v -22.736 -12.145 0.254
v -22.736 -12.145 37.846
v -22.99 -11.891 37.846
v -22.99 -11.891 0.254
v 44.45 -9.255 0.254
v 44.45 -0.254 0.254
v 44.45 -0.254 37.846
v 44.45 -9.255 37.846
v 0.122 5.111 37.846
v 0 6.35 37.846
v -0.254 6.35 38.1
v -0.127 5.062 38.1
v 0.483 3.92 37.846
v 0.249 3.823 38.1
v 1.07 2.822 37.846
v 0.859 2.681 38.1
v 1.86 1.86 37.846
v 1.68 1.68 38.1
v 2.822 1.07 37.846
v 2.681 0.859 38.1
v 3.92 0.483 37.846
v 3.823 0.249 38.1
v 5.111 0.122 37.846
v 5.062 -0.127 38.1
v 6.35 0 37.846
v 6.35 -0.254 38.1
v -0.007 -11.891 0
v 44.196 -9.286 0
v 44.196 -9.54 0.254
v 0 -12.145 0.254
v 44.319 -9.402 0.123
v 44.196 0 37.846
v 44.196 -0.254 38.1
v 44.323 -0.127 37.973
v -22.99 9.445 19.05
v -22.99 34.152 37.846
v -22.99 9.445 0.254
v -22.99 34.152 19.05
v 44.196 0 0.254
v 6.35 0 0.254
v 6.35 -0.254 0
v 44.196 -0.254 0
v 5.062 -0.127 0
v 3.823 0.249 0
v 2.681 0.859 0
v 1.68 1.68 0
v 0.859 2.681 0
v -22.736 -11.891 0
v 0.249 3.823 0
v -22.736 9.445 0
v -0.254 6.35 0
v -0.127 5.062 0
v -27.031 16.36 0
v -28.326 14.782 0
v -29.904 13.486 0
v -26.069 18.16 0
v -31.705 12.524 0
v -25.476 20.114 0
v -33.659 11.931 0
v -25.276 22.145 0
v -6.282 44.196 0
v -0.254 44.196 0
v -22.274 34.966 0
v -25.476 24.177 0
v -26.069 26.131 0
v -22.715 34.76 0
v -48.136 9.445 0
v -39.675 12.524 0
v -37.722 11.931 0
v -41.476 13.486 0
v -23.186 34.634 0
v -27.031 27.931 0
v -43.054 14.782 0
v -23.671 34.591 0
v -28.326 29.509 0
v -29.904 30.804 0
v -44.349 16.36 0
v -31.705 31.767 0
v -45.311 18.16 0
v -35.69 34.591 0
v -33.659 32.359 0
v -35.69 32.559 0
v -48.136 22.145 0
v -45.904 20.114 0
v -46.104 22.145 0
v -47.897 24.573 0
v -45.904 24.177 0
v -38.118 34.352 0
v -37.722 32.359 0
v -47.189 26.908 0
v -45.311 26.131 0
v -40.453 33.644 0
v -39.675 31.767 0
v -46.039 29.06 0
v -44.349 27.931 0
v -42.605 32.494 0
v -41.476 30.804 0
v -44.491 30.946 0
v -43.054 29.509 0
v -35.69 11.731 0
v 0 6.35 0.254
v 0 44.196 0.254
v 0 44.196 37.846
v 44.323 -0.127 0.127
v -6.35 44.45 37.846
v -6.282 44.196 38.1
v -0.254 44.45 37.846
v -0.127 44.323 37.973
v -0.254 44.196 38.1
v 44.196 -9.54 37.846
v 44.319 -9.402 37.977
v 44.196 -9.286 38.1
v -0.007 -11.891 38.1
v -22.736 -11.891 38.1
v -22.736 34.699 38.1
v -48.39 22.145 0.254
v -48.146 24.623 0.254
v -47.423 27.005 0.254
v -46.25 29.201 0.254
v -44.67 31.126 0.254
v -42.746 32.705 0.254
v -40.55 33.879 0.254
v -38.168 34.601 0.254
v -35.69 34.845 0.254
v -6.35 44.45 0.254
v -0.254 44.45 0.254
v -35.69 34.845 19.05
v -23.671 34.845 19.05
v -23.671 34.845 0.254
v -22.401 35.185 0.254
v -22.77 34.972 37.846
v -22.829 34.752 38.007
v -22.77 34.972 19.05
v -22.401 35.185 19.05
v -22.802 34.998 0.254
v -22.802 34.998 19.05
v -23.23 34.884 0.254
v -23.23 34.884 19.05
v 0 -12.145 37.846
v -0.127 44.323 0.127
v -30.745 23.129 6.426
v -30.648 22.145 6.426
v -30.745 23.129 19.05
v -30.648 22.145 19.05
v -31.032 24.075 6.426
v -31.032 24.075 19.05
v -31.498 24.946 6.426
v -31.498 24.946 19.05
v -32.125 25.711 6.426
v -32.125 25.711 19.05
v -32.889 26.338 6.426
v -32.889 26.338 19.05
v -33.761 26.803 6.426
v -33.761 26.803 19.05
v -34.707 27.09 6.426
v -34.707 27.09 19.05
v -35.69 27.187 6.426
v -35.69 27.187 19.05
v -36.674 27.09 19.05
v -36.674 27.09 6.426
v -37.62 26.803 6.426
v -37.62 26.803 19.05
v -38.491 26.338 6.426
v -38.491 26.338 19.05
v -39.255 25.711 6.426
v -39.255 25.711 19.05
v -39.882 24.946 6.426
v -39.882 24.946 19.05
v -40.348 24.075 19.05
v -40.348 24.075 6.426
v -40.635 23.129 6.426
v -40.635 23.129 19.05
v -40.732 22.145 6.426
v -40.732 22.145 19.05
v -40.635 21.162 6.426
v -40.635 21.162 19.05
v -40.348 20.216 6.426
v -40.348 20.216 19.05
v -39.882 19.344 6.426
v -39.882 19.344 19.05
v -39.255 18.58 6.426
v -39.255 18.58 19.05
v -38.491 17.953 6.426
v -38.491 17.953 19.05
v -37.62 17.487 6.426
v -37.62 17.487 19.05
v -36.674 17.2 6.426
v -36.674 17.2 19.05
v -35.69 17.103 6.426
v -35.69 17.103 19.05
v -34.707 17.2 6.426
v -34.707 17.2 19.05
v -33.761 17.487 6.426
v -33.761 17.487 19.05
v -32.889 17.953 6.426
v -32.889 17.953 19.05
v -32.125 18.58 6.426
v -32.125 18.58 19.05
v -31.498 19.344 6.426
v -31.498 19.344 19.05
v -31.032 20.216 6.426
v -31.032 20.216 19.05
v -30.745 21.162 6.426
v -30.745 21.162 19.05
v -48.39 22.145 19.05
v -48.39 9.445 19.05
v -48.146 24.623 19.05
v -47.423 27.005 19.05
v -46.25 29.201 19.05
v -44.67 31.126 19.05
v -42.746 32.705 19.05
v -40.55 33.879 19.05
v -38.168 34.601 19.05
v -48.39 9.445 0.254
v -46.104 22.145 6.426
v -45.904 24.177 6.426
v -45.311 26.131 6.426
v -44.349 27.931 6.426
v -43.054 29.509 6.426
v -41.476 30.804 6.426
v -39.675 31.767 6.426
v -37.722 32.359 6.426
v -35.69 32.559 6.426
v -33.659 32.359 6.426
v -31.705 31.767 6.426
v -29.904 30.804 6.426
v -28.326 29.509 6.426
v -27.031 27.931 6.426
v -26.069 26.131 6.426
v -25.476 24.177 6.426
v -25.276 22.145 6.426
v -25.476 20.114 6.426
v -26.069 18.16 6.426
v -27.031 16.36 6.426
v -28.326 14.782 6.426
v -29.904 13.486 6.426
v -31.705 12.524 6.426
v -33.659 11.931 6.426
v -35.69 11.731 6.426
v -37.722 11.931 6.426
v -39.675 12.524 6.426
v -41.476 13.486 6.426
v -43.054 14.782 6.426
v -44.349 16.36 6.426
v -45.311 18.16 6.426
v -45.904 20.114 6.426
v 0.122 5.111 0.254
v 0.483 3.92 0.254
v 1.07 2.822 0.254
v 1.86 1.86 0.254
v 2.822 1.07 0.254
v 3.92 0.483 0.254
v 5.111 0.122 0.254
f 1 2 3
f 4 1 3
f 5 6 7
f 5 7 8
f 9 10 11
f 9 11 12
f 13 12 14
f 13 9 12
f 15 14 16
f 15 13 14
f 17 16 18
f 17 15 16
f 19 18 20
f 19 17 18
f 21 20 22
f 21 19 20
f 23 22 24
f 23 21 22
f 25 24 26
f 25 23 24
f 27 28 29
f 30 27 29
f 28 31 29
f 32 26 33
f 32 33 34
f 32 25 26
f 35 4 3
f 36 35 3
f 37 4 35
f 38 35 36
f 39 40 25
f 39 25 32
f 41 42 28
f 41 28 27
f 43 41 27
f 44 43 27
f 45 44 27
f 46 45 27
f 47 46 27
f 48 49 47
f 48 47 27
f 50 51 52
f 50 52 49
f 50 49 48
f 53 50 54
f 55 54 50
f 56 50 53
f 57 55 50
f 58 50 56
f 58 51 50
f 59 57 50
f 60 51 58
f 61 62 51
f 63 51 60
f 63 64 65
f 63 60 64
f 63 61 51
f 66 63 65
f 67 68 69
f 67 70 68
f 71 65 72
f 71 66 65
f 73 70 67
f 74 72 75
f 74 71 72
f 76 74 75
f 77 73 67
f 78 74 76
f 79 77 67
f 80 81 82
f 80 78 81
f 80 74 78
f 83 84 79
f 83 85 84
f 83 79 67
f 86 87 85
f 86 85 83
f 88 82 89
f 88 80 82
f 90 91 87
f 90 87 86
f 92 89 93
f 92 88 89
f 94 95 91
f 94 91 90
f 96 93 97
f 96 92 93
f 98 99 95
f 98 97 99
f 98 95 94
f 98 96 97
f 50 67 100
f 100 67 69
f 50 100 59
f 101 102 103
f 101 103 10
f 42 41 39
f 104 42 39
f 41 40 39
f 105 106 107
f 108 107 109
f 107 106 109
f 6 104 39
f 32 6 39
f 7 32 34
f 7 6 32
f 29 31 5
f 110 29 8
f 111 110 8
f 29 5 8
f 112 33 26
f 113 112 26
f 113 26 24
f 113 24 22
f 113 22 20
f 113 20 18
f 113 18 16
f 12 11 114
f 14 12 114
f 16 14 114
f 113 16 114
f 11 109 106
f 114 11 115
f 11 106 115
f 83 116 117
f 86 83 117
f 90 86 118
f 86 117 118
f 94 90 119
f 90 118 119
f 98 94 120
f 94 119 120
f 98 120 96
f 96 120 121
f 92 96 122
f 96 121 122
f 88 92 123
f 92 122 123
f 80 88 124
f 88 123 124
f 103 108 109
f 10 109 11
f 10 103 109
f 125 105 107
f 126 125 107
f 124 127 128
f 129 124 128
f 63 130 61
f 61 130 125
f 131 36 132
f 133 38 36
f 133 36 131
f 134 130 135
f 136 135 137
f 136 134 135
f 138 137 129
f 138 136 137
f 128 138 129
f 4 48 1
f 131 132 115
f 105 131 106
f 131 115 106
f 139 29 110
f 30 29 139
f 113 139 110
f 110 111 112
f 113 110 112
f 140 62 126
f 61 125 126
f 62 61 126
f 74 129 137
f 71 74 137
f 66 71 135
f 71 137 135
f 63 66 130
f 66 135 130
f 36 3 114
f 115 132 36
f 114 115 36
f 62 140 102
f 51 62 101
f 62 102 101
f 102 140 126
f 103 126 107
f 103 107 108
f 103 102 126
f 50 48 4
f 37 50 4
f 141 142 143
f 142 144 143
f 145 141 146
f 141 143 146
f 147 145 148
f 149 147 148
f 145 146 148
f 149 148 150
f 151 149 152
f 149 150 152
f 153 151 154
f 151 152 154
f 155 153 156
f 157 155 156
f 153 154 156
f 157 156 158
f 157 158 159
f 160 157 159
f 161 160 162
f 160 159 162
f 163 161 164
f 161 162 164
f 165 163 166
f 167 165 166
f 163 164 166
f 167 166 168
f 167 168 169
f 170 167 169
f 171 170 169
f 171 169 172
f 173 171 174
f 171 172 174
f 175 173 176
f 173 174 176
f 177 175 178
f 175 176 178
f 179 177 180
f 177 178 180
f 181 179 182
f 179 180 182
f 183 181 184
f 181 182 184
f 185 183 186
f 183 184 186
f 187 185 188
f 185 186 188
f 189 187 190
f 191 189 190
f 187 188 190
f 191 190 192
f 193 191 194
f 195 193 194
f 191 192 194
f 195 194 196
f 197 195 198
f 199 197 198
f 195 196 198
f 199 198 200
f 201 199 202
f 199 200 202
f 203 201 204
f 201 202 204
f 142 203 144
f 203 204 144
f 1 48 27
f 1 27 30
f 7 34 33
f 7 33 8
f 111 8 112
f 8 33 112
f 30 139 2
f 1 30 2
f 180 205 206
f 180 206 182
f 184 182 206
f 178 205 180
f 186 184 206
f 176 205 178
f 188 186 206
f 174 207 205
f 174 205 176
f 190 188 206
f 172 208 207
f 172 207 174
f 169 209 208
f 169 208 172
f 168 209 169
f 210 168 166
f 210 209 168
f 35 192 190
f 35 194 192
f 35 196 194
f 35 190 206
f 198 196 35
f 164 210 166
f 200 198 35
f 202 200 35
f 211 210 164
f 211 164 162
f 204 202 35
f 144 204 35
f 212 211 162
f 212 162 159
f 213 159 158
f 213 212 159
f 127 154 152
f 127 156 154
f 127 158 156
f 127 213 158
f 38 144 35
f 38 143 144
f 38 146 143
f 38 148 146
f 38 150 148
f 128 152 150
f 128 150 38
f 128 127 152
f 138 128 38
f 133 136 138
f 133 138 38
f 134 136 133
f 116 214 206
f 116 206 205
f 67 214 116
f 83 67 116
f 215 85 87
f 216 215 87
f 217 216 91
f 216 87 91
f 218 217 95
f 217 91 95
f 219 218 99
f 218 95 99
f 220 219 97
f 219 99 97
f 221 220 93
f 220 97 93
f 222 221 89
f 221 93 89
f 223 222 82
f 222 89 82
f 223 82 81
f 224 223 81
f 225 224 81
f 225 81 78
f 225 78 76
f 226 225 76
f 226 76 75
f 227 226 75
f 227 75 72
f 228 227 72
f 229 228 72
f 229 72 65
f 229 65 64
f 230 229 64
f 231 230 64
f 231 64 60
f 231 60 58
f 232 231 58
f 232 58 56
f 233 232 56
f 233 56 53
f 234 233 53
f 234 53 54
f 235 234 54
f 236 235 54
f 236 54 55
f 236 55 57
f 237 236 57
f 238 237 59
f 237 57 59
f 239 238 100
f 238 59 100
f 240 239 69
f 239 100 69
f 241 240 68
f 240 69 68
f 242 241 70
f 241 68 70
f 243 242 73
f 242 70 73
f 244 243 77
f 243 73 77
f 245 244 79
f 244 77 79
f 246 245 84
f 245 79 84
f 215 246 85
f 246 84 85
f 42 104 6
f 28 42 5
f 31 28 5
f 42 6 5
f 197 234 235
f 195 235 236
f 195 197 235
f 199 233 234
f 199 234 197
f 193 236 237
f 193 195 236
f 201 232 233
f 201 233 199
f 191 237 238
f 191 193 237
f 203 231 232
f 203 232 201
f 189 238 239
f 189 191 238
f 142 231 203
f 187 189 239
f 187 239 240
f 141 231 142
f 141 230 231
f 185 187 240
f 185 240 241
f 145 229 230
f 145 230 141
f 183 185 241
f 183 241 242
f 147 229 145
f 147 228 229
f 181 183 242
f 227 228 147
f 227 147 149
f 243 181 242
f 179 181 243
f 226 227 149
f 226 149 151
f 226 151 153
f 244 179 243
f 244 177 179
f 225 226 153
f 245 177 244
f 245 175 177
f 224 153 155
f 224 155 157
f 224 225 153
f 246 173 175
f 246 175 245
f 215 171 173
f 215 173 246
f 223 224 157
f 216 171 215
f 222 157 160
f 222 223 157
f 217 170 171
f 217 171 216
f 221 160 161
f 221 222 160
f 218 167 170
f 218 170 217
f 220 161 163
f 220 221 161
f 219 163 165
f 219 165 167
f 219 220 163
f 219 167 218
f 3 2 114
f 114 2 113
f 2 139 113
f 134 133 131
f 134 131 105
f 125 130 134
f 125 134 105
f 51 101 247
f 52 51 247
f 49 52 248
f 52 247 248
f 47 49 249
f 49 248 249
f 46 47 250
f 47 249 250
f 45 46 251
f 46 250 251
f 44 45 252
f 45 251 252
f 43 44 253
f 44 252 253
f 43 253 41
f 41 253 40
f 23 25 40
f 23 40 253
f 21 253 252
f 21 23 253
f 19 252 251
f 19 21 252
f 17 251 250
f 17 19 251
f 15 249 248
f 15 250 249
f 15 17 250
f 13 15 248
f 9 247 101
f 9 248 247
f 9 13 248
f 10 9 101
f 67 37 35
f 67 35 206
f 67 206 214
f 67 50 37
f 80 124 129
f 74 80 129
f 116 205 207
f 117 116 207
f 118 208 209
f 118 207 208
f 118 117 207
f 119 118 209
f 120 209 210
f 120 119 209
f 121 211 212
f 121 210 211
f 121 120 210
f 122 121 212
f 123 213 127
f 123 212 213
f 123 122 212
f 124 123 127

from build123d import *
from OCP.BRepFilletAPI import BRepFilletAPI_MakeChamfer

# Parameters (mm, degrees)
BOSS_EXTRUDE1_DEPTH                                  = 38.1
FILLET2_R                                            = 6.35
CUT_EXTRUDE1_START                                   = -19.05
CUT_EXTRUDE1_DEPTH                                   = 19.05
FILLET3_R                                            = 2.54
CBORE_FOR_3_8_BINDING_HEAD_MACHINE_SCREW_D           = 10.0838
CBORE_FOR_3_8_BINDING_HEAD_MACHINE_SCREW_CBORE_D     = 20.828
CBORE_FOR_3_8_BINDING_HEAD_MACHINE_SCREW_CBORE_DEPTH = 6.4262
CHAMFER3_SIZE                                        = 0.254
CHAMFER5_SIZE                                        = 0.254
CHAMFER5_SIZE2                                       = 0.270375256


with BuildPart() as part:
    # Sketch1 → Boss-Extrude1 (new body)
    with BuildSketch(Plane.XY):
        with BuildLine():
            Line((0, 0), (44.45, 0))
            Line((44.45, 0), (44.45, -9.525))
            Line((44.45, -9.525), (0, -12.1446544))
            Line((0, -12.1446544), (-22.9902, -12.1446544))
            Line((-22.9902, -12.1446544), (-22.9902, 9.4453456))
            Line((-22.9902, 9.4453456), (-48.3902, 9.4453456))
            Line((-48.3902, 9.4453456), (-48.3902, 22.1453456))
            ThreePointArc((-48.3902, 22.1453456), (-44.670456121, 31.125601721), (-35.6902, 34.8453456))
            Line((-35.6902, 34.8453456), (-22.9902, 34.8453456))
            Line((-22.9902, 34.8453456), (-6.35, 44.45))
            Line((-6.35, 44.45), (0, 44.45))
            Line((0, 44.45), (0, 0))
        make_face()
    extrude(amount=BOSS_EXTRUDE1_DEPTH)

    # Fillet2
    fillet2_edges = [part.edges().sort_by_distance(p)[0] for p in [
        (0, 0, 19.05),
    ]]
    fillet(fillet2_edges, radius=FILLET2_R)

    # Sketch3 → Cut-Extrude1 (cut)
    with BuildSketch(Plane.XY.offset(38.1).offset(CUT_EXTRUDE1_START)):
        with BuildLine():
            Line((-48.3902, 9.4453456), (-22.9902, 9.4453456))
            Line((-22.9902, 9.4453456), (-22.9902, 34.8453456))
            Line((-22.9902, 34.8453456), (-35.6902, 34.8453456))
            ThreePointArc((-35.6902, 34.8453456), (-44.670456121, 31.125601721), (-48.3902, 22.1453456))
            Line((-48.3902, 22.1453456), (-48.3902, 9.4453456))
        make_face()
    extrude(amount=CUT_EXTRUDE1_DEPTH, mode=Mode.SUBTRACT)

    # Fillet3
    fillet3_edges = [part.edges().sort_by_distance(p)[0] for p in [
        (-22.9902, 34.8453456, 9.525),
    ]]
    fillet(fillet3_edges, radius=FILLET3_R)

    # CBORE for 3/8 Binding Head Machine Screw1 (through all)
    with Locations(Plane(origin=(0, 0, 0), x_dir=(-1, 0, 0), z_dir=(0, 0, -1))):
        with Locations((35.6902, 22.1453456)):
            CounterBoreHole(CBORE_FOR_3_8_BINDING_HEAD_MACHINE_SCREW_D / 2, CBORE_FOR_3_8_BINDING_HEAD_MACHINE_SCREW_CBORE_D / 2, CBORE_FOR_3_8_BINDING_HEAD_MACHINE_SCREW_CBORE_DEPTH)

    # Chamfer3
    chamfer3_edges = [part.edges().sort_by_distance(p)[0] for p in [
        (25.4, 0, 0),
        (44.45, 0, 19.05),
        (0, 44.45, 19.05),
        (0, 25.4, 0),
        (0, 25.4, 38.1),
        (1.859871939, 1.859871939, 0),
        (1.859871939, 1.859871939, 38.1),
        (25.4, 0, 38.1),
    ]]
    chamfer(chamfer3_edges, length=CHAMFER3_SIZE)

    # Chamfer5: one chamfer whose edges measure the first distance from different faces: ONE call of the kernel's chamfer builder (chamfer() names one face for all edges)
    chamfer5_edges_1 = [part.edges().sort_by_distance(p)[0] for p in [
        (44.45, -4.8895, 0),
        (-14.6701, 39.6476728, 38.1),
        (-48.3902, 15.7953456, 0),
        (-44.670456121, 31.125601721, 0),
        (-14.375444039, 39.817746998, 0),
        (44.45, -4.8895, 38.1),
        (-29.680416649, 34.8453456, 0),
        (-23.013375005, 34.931855935, 0),
        (-3.302, 44.45, 38.1),
        (-3.302, 44.45, 0),
    ]]
    chamfer5_edges_2 = [part.edges().sort_by_distance(p)[0] for p in [
        (44.45, -9.525, 19.05),
    ]]
    chamfer5_side_2 = [part.faces().sort_by_distance(p)[0] for p in [
        (22.225, -10.8348272, 19.05),
    ]]
    chamfer5 = BRepFilletAPI_MakeChamfer(part.part.solid().wrapped)
    for e in chamfer5_edges_1:
        chamfer5.Add(CHAMFER5_SIZE, e.wrapped)
    for e in chamfer5_edges_2:
        chamfer5.Add(CHAMFER5_SIZE, CHAMFER5_SIZE2, e.wrapped, chamfer5_side_2[0].wrapped)  # the first distance lies on this face
    add(Compound.cast(chamfer5.Shape()), mode=Mode.REPLACE)

    # Chamfer6
    # the kernel refuses this chamfer: 0.693641083, 0.254 mm, written as the material it takes off along each edge
    with BuildSketch(Plane(origin=(-22.820866667, -11.975321067, 0.169333333), x_dir=(0, -0.7071067811865468, 0.7071067811865481), z_dir=(-0.5773502691896234, -0.5773502691896274, -0.5773502691896264))) as chamfer6_piece_1:
        Polygon((-0.179605122, -0.103695066), (0.179605122, -0.103695066), (0, 0.207390132), align=None)
    extrude(amount=0.32262333, mode=Mode.SUBTRACT)
    with BuildSketch(Plane(origin=(-22.820866667, -11.975321067, 37.930666667), x_dir=(0, -0.70710678118655, -0.707106781186545), z_dir=(-0.5773502691896217, -0.5773502691896258, 0.5773502691896298))) as chamfer6_piece_2:
        Polygon((-0.179605122, 0.103695066), (0.179605122, 0.103695066), (0, -0.207390132), align=None)
    extrude(amount=0.32262333, mode=Mode.SUBTRACT)
    with BuildSketch(Plane(origin=(-22.9902, 34.8453456, 19.05), x_dir=(-0.009971465906807519, -0.9999502836979793, 0), z_dir=(0, 0, 1))) as chamfer6_piece_3:
        with BuildLine():
            Line((0.720476303, 0), (-0.15603149, 0.22562472))
            Line((-0.15603149, 0.22562472), (-0.16797676, 0.218570238))
            ThreePointArc((-0.16797676, 0.218570238), (-0.081514433, 0.11074615), (-0.01194527, -0.007054482))
            Line((-0.01194527, -0.007054482), (0.000138332, -0.013872132))
            ThreePointArc((0.000138332, -0.013872132), (0.360340666, -0.010280208), (0.720614636, -0.013872132))
            Line((0.720614636, -0.013872132), (0.720476303, 0))
        make_face()
    extrude(amount=20.597190759, mode=Mode.SUBTRACT)
    with BuildSketch(Plane(origin=(-22.9902, -12.797861879, 0), x_dir=(0.9996219169112968, 0, -0.027495876610586136), z_dir=(0, 1, 0))) as chamfer6_piece_4:
        with BuildLine():
            Line((0.261282992, 0), (-0.014362977, -0.26088792))
            Line((-0.014362977, -0.26088792), (-0.019441057, -0.260748241))
            ThreePointArc((-0.019441057, -0.260748241), (-0.008668824, -0.130403049), (-0.005078079, 0.000139679))
            Line((-0.005078079, 0.000139679), (0.000139679, 0.005078079))
            ThreePointArc((0.000139679, 0.005078079), (0.130682407, 0.001487335), (0.261422671, 0.005078079))
            Line((0.261422671, 0.005078079), (0.261282992, 0))
        make_face()
    extrude(amount=22.243207479, mode=Mode.SUBTRACT)
    with BuildSketch(Plane(origin=(44.848076027, -9.501539446, 0), x_dir=(-0.058810529584687465, 0.9978904240343144, -0.027495876610586504), z_dir=(-0.9982678522272378, -0.05883277326131908, 0)), Plane(origin=(44.848076027, -9.501539446, 38.1), x_dir=(0.0016176586742518812, -0.02744824968915599, -0.9996219169112968), z_dir=(-0.9982678522272378, -0.05883277326131908, 0))) as chamfer6_piece_5:
        with BuildLine():
            Line((0.261282992, 0), (-0.014362977, -0.26088792))
            Line((-0.014362977, -0.26088792), (-0.019441057, -0.260748241))
            ThreePointArc((-0.019441057, -0.260748241), (-0.008668824, -0.130403049), (-0.005078079, 0.000139679))
            Line((-0.005078079, 0.000139679), (0.000139679, 0.005078079))
            ThreePointArc((0.000139679, 0.005078079), (0.130682407, 0.001487335), (0.261422671, 0.005078079))
            Line((0.261422671, 0.005078079), (0.261282992, 0))
        make_face()
    extrude(amount=45.579101794, mode=Mode.SUBTRACT)
    with BuildSketch(Plane(origin=(0.653207479, -12.1446544, 0), x_dir=(0, 0.9996219169112968, -0.0274958766105868), z_dir=(-1, 0, 0)), Plane(origin=(0.653207479, -12.1446544, 38.1), x_dir=(0, -0.027495876610587867, -0.9996219169112968), z_dir=(-1, 0, 0))) as chamfer6_piece_6:
        with BuildLine():
            Line((0.261282992, 0), (-0.014362977, -0.26088792))
            Line((-0.014362977, -0.26088792), (-0.019441057, -0.260748241))
            ThreePointArc((-0.019441057, -0.260748241), (-0.008668824, -0.130403049), (-0.005078079, 0.000139679))
            Line((-0.005078079, 0.000139679), (0.000139679, 0.005078079))
            ThreePointArc((0.000139679, 0.005078079), (0.130682407, 0.001487335), (0.261422671, 0.005078079))
            Line((0.261422671, 0.005078079), (0.261282992, 0))
        make_face()
    extrude(amount=24.296614958, mode=Mode.SUBTRACT)
    with BuildSketch(Plane(origin=(-22.9902, -12.1446544, -0.653207479), x_dir=(0.9996219169112968, -0.027495876610587118, 0), z_dir=(0, 0, 1))) as chamfer6_piece_7:
        with BuildLine():
            Line((0.261282992, 0), (-0.014362977, 0.26088792))
            Line((-0.014362977, 0.26088792), (-0.019441057, 0.260748241))
            ThreePointArc((-0.019441057, 0.260748241), (-0.008668824, 0.130403049), (-0.005078079, -0.000139679))
            Line((-0.005078079, -0.000139679), (0.000139679, -0.005078079))
            ThreePointArc((0.000139679, -0.005078079), (0.130682407, -0.001487335), (0.261422671, -0.005078079))
            Line((0.261422671, -0.005078079), (0.261282992, 0))
        make_face()
    extrude(amount=39.406414958, mode=Mode.SUBTRACT)
    with BuildSketch(Plane(origin=(-22.9902, 35.205278751, 38.1), x_dir=(-0.027495876610587867, 0, -0.9996219169112968), z_dir=(0, -1, 0))) as chamfer6_piece_8:
        with BuildLine():
            Line((0.261282992, 0), (-0.014362977, 0.26088792))
            Line((-0.014362977, 0.26088792), (-0.019441057, 0.260748241))
            ThreePointArc((-0.019441057, 0.260748241), (-0.008668824, 0.130403049), (-0.005078079, -0.000139679))
            Line((-0.005078079, -0.000139679), (0.000139679, -0.005078079))
            ThreePointArc((0.000139679, -0.005078079), (0.130682407, -0.001487335), (0.261422671, -0.005078079))
            Line((0.261422671, -0.005078079), (0.261282992, 0))
        make_face()
    extrude(amount=48.00314063, mode=Mode.SUBTRACT)


solid = part.part
